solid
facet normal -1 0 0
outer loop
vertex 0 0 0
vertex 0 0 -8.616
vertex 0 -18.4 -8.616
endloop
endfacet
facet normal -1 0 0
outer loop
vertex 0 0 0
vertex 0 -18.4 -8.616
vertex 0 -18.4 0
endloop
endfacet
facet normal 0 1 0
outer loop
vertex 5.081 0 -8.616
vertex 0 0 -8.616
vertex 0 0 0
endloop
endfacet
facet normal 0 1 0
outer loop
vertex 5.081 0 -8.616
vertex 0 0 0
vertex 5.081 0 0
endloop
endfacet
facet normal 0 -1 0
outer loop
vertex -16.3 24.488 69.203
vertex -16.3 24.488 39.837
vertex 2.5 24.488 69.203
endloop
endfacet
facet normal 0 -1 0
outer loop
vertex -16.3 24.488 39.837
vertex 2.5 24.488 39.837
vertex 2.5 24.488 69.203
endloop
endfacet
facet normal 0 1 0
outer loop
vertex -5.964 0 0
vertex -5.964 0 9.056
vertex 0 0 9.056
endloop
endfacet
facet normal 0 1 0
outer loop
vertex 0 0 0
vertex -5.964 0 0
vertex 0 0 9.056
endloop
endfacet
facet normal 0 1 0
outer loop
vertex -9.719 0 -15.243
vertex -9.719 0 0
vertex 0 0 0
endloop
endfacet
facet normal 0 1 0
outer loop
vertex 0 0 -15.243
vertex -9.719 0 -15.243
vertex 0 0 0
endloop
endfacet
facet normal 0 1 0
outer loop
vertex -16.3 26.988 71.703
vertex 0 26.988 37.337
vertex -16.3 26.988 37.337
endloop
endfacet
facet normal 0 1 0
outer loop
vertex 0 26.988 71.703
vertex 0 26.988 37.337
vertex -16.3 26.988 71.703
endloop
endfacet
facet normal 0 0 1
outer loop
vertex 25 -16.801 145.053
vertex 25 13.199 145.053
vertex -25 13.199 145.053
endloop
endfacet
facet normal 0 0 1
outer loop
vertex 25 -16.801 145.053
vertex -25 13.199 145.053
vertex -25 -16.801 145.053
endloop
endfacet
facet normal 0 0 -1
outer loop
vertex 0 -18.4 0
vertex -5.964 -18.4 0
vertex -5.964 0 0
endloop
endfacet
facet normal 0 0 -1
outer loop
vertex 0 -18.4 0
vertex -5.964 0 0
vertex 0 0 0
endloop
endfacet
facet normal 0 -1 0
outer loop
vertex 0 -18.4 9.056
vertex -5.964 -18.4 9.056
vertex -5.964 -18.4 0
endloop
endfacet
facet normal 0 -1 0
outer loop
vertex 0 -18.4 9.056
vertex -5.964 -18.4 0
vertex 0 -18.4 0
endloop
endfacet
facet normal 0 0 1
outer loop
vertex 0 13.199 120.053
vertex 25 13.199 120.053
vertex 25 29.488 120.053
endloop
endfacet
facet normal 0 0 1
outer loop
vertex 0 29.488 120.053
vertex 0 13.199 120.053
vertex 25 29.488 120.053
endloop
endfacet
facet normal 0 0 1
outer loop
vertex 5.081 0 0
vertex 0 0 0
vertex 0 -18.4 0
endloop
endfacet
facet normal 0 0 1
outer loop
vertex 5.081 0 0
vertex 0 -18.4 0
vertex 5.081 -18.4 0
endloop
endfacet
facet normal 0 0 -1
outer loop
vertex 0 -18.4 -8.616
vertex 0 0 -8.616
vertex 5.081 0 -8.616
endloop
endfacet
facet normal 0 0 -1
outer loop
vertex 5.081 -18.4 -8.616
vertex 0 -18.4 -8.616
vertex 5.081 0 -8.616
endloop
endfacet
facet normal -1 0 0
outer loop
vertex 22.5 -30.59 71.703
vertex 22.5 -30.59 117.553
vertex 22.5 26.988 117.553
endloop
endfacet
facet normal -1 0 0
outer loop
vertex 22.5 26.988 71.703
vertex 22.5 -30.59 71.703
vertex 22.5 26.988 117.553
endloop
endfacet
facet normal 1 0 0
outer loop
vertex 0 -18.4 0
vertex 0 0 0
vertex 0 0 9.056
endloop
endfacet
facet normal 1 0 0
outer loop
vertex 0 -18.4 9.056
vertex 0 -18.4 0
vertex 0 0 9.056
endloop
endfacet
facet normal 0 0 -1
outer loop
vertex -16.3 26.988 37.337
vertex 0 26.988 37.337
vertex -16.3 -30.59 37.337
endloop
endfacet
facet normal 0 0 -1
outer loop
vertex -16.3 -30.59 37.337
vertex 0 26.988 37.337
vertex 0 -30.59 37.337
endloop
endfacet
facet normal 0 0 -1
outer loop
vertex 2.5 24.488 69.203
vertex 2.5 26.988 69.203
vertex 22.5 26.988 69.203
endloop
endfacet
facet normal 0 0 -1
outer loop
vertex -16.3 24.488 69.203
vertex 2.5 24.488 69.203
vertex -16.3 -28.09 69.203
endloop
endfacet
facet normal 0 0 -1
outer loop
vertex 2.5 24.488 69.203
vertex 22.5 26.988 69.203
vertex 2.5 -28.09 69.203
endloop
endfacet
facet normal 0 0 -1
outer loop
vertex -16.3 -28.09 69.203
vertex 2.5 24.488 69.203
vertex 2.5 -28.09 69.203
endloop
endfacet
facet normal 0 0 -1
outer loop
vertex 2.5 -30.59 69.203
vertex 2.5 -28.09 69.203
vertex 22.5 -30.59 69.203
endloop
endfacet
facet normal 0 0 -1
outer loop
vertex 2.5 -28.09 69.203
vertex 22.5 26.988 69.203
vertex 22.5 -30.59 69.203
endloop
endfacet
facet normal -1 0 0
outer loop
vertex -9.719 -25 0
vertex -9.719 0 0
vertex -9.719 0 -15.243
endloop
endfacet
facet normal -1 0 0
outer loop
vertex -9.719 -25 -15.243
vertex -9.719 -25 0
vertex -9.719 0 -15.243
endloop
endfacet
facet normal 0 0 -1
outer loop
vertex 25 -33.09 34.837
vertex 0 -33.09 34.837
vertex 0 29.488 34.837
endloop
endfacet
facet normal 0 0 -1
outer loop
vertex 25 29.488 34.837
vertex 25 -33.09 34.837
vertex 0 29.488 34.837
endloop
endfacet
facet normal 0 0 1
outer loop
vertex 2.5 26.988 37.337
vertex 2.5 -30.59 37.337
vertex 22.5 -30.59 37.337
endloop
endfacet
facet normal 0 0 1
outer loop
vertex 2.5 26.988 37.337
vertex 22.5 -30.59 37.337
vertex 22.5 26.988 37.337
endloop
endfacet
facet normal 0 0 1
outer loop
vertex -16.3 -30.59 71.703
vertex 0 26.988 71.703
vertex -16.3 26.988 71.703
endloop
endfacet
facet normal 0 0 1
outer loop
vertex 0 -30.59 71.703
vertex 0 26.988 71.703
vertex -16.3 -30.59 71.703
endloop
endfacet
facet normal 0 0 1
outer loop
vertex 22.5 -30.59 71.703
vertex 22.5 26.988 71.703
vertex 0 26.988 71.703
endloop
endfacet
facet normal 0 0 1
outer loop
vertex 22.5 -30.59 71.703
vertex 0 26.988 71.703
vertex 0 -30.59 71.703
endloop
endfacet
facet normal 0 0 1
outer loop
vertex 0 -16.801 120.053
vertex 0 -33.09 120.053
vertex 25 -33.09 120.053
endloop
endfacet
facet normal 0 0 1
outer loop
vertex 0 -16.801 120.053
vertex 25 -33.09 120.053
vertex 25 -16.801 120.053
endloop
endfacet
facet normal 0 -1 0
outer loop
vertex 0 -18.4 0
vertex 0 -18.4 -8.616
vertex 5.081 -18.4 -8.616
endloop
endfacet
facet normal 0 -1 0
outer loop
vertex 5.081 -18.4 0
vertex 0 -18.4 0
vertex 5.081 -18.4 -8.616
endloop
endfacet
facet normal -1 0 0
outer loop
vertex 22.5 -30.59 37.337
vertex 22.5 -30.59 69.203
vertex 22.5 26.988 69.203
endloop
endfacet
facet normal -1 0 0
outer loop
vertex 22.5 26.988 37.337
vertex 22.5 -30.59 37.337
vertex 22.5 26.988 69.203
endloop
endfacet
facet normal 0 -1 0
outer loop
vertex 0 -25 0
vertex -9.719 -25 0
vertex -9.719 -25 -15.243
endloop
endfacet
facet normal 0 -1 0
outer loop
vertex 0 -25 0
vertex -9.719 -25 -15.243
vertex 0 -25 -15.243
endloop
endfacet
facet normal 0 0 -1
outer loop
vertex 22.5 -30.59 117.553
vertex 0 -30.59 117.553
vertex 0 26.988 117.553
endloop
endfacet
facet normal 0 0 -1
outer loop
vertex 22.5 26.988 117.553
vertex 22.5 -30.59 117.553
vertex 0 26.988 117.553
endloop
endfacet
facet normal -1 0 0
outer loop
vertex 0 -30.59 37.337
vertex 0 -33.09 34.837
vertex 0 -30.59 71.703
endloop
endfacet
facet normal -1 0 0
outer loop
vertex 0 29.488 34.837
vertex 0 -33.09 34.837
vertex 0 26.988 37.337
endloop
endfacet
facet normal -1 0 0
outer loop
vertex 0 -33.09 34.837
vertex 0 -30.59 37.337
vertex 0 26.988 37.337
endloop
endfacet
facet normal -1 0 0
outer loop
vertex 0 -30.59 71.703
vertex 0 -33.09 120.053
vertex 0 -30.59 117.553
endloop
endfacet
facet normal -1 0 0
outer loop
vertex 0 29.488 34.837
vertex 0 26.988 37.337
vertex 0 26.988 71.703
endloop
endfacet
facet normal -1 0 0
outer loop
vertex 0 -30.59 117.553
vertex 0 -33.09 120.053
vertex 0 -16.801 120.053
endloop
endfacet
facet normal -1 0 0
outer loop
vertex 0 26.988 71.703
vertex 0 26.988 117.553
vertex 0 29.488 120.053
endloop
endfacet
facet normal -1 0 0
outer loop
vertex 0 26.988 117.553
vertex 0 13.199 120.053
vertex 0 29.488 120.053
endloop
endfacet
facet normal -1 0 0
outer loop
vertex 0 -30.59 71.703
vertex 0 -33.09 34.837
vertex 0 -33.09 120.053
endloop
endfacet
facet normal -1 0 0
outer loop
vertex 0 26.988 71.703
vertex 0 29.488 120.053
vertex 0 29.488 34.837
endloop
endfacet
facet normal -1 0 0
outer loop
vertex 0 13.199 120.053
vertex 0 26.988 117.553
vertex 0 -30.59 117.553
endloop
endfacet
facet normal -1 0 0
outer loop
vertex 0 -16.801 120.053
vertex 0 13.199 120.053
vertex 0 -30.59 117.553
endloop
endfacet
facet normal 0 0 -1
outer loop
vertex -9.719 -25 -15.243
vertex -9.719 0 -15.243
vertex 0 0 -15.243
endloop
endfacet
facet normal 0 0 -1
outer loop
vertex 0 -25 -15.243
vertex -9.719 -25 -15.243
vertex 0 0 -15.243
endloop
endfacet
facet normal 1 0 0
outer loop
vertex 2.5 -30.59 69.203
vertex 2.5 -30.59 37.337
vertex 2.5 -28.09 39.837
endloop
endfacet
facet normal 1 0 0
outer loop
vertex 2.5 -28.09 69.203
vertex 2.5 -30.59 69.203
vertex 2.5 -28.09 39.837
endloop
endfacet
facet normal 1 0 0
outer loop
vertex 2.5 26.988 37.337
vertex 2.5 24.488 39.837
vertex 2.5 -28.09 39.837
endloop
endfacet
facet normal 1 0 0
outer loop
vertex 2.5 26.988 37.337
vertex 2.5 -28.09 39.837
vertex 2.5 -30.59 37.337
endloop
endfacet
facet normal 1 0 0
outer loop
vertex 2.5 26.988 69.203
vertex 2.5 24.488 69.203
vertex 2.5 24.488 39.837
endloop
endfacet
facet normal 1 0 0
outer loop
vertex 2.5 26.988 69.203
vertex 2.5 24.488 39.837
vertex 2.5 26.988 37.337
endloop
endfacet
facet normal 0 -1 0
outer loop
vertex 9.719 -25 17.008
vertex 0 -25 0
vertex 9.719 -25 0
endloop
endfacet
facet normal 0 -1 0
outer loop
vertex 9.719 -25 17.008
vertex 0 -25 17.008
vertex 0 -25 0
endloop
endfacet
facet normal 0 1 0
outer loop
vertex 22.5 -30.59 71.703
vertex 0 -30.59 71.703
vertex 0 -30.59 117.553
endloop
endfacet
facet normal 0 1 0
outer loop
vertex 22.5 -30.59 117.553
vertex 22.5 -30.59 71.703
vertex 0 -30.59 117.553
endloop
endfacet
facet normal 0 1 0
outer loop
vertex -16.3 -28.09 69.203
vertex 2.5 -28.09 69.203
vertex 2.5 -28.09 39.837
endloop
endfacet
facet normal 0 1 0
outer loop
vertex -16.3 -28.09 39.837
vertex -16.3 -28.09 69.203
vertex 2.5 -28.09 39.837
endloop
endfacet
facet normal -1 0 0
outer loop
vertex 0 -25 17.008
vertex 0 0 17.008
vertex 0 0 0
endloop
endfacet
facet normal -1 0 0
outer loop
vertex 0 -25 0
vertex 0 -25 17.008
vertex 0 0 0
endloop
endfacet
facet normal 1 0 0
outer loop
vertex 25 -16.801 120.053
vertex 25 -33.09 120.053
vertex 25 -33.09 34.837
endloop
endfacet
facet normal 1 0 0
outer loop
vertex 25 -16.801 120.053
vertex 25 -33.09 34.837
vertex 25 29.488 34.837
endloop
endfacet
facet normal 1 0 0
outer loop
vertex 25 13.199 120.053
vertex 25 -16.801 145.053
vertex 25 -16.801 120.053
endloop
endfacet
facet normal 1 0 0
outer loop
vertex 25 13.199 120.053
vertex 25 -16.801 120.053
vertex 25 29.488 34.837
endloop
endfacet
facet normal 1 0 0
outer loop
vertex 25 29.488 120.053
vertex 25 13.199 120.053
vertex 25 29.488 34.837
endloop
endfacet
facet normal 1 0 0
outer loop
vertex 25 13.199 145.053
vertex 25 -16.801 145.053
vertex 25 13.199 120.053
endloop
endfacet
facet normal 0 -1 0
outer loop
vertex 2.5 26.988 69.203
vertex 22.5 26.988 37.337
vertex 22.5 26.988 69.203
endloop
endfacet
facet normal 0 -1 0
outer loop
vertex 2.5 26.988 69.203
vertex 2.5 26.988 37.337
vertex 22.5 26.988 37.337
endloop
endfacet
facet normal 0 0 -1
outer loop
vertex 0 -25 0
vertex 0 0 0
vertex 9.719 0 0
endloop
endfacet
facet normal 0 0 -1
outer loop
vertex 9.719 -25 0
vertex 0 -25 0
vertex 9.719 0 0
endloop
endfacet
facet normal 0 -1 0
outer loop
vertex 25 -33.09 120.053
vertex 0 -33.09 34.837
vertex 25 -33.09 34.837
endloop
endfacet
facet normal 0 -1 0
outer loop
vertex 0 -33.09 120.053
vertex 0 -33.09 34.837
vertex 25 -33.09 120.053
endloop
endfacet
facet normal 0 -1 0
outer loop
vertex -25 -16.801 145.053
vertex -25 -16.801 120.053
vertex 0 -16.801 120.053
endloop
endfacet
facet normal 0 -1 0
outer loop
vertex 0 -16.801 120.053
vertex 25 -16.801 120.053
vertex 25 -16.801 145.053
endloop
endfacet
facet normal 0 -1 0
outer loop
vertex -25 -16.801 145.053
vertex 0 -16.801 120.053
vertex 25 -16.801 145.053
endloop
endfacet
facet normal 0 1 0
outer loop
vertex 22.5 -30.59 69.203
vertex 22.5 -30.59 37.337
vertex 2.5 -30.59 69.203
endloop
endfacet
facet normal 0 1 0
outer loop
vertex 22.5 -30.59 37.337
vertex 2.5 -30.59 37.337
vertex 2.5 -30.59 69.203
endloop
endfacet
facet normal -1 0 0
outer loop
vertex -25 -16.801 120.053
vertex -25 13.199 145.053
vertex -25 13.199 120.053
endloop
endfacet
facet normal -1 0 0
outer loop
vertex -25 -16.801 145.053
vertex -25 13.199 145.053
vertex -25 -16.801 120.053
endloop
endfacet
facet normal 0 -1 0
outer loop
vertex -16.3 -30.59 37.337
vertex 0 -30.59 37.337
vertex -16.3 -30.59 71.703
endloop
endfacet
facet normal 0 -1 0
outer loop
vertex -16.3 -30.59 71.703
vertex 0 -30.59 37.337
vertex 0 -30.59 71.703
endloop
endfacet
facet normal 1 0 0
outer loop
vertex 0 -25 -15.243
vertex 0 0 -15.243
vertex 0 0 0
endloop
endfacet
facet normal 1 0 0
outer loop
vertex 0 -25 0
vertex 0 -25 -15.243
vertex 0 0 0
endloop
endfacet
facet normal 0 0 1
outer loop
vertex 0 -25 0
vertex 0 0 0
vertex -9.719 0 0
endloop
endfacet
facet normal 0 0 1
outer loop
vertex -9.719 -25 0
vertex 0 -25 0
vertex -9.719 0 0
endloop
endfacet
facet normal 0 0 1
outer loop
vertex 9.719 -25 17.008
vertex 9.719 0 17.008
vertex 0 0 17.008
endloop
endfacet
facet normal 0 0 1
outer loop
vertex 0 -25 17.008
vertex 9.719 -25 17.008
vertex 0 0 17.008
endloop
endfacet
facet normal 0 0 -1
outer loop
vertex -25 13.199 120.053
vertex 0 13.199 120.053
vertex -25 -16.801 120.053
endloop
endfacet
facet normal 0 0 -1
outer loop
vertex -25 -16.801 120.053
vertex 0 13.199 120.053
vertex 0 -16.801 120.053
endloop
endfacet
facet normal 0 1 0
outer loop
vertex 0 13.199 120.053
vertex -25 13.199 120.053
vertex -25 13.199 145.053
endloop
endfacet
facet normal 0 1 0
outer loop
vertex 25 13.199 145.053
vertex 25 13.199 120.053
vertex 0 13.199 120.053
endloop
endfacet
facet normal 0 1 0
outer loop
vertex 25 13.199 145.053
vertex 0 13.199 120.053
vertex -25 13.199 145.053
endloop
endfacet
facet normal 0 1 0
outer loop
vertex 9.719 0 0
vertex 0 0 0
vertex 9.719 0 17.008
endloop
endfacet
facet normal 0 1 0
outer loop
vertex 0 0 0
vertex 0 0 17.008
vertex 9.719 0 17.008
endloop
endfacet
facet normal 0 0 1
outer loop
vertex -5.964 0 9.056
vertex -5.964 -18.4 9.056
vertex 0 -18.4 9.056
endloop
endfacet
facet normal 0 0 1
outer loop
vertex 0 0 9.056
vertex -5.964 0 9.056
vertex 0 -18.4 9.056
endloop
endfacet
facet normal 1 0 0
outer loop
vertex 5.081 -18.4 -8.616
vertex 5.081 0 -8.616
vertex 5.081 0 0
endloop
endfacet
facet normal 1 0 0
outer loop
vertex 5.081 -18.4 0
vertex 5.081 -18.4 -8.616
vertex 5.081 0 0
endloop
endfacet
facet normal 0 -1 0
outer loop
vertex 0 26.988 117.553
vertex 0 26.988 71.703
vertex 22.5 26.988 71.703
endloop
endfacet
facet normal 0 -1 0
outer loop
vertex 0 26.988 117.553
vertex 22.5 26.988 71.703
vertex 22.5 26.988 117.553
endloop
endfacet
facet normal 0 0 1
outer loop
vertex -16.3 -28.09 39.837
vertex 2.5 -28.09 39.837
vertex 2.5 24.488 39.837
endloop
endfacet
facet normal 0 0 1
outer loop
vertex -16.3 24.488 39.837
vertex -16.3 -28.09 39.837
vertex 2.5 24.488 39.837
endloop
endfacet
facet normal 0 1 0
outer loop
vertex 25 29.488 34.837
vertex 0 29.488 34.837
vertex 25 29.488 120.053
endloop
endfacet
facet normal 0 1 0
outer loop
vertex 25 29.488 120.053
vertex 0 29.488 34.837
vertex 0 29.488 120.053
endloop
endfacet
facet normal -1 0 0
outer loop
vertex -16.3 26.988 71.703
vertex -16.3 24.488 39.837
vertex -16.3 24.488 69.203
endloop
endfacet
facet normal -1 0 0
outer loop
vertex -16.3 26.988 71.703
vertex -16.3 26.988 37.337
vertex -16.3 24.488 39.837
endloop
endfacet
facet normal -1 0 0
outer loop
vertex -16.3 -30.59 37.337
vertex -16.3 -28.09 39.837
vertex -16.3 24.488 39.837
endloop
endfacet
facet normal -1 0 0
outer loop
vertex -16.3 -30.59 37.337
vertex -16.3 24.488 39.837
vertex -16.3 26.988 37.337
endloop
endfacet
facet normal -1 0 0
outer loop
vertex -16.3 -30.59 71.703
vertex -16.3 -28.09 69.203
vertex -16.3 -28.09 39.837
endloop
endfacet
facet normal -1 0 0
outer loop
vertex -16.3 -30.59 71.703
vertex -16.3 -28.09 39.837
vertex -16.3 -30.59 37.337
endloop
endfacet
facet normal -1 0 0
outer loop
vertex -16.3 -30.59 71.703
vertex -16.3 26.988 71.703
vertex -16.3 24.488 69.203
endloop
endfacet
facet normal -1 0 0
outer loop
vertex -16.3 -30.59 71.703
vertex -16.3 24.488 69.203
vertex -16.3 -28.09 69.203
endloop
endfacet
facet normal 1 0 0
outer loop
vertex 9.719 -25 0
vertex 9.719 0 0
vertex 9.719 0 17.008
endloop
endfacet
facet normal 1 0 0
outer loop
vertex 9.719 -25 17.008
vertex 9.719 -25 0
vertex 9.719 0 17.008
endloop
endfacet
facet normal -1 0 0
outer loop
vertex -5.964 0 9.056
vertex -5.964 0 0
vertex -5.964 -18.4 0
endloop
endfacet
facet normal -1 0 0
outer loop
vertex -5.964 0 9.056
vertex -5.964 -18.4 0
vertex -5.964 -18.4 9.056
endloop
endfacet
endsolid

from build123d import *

# Parameters (mm, degrees)
F1_DEPTH  = 25
F0_W      = 5.9642354026
F0_H      = 9.0555474162
F2_DEPTH  = 18.4
F0_W_2    = 5.0806454383
F0_H_2    = 8.6162630469
F3_W      = 62.5787544996
F3_H      = 85.215434432
F4_DEPTH  = 25
F5_T      = -2.5
F6_W      = 57.5787544996
F6_H      = 34.3654131889
F7_DEPTH  = 38.8
F8_T      = -2.5
F9_W      = 25
F9_H      = 15
F10_DEPTH = 25
F11_W     = 30
F11_H     = 25
F12_DEPTH = 25


# Not quite as in the source:
# - a shell that OpenCascade refuses in one call is made with other operations: the cavity is built on its own and cut out


with BuildPart() as f1:
    # F0 (on Front) → F1 (new body)
    with BuildSketch(Plane.XZ):
        Polygon((0, 9.0555474162), (0, 0), (5.0806454383, 0), (9.7194965929, 0), (9.7194965929, 17.0078612864), (0, 17.0078612864), align=None)
    extrude(amount=F1_DEPTH)


with BuildPart() as f1b:
    # F0 (on Front) → F1, piece 2 (new body)
    with BuildSketch(Plane.XZ):
        Polygon((0, -8.6162630469), (0, 0), (-5.9642354026, 0), (-9.719, 0), (-9.719, -15.243191272), (0, -15.243191272), align=None)
    extrude(amount=F1_DEPTH)


with BuildPart() as f2:
    # F0 (on Front) → F2 (new body)
    with BuildSketch(Plane.XZ):
        with Locations((-2.9821177013, 4.5277737081)):
            Rectangle(F0_W, F0_H)
    extrude(amount=F2_DEPTH)


with BuildPart() as f2b:
    # F0 (on Front) → F2, piece 2 (new body)
    with BuildSketch(Plane.XZ):
        with Locations((2.5403227191, -4.3081315234)):
            Rectangle(F0_W_2, F0_H_2)
    extrude(amount=F2_DEPTH)


with BuildPart() as f4:
    # F3 (on Right) → F4 (new body)
    with BuildSketch(Plane.YZ):
        with Locations((-1.8009757623, 77.4449631572)):
            Rectangle(F3_W, F3_H)
    extrude(amount=F4_DEPTH)

    # F5
    f5_openings = [f4.faces().sort_by_distance(p)[0] for p in [
        (0, -1.800976, 77.444963),
    ]]
    offset(amount=F5_T, openings=f5_openings)

    # F6 (on face) → F7 (join)
    with BuildSketch(Plane(origin=(22.5, 0, 0), x_dir=(0, -1, 0), z_dir=(-1, 0, 0))):
        with Locations((1.8009757623, 54.5199525356)):
            Rectangle(F6_W, F6_H)
    extrude(amount=F7_DEPTH)

    # F8: a shell. OpenCascade refuses it in one call, so the cavity is built on its own and cut out:
    # the body offset inwards by the wall thickness, plus a prism from it out through each open face.
    f8_core = offset(f4.part, amount=F8_T, kind=Kind.INTERSECTION, mode=Mode.PRIVATE)
    f8_exits = [f8_core.faces().sort_by_distance(p)[0] for p in [
        (-13.8, -1.800976, 54.519953),
    ]]
    add(f8_core, mode=Mode.SUBTRACT)
    extrude(f8_exits, amount=-F8_T, mode=Mode.SUBTRACT)

    # F9 (on face) → F10 (join)
    with BuildSketch(Plane.XY.offset(120.0526803732)):
        with Locations((12.5, -9.3009757623)):
            Rectangle(F9_W, F9_H)
        with Locations((12.5, 5.6990242377)):
            Rectangle(F9_W, F9_H)
    extrude(amount=F10_DEPTH)

    # F11 (on face) → F12 (join)
    with BuildSketch(Plane(origin=(0, 0, 0), x_dir=(0, -1, 0), z_dir=(-1, 0, 0))):
        with Locations((1.8009757623, 132.5526803732)):
            Rectangle(F11_W, F11_H)
    extrude(amount=F12_DEPTH)


solid = Compound([f1.part, f1b.part, f2.part, f2b.part, f4.part])
